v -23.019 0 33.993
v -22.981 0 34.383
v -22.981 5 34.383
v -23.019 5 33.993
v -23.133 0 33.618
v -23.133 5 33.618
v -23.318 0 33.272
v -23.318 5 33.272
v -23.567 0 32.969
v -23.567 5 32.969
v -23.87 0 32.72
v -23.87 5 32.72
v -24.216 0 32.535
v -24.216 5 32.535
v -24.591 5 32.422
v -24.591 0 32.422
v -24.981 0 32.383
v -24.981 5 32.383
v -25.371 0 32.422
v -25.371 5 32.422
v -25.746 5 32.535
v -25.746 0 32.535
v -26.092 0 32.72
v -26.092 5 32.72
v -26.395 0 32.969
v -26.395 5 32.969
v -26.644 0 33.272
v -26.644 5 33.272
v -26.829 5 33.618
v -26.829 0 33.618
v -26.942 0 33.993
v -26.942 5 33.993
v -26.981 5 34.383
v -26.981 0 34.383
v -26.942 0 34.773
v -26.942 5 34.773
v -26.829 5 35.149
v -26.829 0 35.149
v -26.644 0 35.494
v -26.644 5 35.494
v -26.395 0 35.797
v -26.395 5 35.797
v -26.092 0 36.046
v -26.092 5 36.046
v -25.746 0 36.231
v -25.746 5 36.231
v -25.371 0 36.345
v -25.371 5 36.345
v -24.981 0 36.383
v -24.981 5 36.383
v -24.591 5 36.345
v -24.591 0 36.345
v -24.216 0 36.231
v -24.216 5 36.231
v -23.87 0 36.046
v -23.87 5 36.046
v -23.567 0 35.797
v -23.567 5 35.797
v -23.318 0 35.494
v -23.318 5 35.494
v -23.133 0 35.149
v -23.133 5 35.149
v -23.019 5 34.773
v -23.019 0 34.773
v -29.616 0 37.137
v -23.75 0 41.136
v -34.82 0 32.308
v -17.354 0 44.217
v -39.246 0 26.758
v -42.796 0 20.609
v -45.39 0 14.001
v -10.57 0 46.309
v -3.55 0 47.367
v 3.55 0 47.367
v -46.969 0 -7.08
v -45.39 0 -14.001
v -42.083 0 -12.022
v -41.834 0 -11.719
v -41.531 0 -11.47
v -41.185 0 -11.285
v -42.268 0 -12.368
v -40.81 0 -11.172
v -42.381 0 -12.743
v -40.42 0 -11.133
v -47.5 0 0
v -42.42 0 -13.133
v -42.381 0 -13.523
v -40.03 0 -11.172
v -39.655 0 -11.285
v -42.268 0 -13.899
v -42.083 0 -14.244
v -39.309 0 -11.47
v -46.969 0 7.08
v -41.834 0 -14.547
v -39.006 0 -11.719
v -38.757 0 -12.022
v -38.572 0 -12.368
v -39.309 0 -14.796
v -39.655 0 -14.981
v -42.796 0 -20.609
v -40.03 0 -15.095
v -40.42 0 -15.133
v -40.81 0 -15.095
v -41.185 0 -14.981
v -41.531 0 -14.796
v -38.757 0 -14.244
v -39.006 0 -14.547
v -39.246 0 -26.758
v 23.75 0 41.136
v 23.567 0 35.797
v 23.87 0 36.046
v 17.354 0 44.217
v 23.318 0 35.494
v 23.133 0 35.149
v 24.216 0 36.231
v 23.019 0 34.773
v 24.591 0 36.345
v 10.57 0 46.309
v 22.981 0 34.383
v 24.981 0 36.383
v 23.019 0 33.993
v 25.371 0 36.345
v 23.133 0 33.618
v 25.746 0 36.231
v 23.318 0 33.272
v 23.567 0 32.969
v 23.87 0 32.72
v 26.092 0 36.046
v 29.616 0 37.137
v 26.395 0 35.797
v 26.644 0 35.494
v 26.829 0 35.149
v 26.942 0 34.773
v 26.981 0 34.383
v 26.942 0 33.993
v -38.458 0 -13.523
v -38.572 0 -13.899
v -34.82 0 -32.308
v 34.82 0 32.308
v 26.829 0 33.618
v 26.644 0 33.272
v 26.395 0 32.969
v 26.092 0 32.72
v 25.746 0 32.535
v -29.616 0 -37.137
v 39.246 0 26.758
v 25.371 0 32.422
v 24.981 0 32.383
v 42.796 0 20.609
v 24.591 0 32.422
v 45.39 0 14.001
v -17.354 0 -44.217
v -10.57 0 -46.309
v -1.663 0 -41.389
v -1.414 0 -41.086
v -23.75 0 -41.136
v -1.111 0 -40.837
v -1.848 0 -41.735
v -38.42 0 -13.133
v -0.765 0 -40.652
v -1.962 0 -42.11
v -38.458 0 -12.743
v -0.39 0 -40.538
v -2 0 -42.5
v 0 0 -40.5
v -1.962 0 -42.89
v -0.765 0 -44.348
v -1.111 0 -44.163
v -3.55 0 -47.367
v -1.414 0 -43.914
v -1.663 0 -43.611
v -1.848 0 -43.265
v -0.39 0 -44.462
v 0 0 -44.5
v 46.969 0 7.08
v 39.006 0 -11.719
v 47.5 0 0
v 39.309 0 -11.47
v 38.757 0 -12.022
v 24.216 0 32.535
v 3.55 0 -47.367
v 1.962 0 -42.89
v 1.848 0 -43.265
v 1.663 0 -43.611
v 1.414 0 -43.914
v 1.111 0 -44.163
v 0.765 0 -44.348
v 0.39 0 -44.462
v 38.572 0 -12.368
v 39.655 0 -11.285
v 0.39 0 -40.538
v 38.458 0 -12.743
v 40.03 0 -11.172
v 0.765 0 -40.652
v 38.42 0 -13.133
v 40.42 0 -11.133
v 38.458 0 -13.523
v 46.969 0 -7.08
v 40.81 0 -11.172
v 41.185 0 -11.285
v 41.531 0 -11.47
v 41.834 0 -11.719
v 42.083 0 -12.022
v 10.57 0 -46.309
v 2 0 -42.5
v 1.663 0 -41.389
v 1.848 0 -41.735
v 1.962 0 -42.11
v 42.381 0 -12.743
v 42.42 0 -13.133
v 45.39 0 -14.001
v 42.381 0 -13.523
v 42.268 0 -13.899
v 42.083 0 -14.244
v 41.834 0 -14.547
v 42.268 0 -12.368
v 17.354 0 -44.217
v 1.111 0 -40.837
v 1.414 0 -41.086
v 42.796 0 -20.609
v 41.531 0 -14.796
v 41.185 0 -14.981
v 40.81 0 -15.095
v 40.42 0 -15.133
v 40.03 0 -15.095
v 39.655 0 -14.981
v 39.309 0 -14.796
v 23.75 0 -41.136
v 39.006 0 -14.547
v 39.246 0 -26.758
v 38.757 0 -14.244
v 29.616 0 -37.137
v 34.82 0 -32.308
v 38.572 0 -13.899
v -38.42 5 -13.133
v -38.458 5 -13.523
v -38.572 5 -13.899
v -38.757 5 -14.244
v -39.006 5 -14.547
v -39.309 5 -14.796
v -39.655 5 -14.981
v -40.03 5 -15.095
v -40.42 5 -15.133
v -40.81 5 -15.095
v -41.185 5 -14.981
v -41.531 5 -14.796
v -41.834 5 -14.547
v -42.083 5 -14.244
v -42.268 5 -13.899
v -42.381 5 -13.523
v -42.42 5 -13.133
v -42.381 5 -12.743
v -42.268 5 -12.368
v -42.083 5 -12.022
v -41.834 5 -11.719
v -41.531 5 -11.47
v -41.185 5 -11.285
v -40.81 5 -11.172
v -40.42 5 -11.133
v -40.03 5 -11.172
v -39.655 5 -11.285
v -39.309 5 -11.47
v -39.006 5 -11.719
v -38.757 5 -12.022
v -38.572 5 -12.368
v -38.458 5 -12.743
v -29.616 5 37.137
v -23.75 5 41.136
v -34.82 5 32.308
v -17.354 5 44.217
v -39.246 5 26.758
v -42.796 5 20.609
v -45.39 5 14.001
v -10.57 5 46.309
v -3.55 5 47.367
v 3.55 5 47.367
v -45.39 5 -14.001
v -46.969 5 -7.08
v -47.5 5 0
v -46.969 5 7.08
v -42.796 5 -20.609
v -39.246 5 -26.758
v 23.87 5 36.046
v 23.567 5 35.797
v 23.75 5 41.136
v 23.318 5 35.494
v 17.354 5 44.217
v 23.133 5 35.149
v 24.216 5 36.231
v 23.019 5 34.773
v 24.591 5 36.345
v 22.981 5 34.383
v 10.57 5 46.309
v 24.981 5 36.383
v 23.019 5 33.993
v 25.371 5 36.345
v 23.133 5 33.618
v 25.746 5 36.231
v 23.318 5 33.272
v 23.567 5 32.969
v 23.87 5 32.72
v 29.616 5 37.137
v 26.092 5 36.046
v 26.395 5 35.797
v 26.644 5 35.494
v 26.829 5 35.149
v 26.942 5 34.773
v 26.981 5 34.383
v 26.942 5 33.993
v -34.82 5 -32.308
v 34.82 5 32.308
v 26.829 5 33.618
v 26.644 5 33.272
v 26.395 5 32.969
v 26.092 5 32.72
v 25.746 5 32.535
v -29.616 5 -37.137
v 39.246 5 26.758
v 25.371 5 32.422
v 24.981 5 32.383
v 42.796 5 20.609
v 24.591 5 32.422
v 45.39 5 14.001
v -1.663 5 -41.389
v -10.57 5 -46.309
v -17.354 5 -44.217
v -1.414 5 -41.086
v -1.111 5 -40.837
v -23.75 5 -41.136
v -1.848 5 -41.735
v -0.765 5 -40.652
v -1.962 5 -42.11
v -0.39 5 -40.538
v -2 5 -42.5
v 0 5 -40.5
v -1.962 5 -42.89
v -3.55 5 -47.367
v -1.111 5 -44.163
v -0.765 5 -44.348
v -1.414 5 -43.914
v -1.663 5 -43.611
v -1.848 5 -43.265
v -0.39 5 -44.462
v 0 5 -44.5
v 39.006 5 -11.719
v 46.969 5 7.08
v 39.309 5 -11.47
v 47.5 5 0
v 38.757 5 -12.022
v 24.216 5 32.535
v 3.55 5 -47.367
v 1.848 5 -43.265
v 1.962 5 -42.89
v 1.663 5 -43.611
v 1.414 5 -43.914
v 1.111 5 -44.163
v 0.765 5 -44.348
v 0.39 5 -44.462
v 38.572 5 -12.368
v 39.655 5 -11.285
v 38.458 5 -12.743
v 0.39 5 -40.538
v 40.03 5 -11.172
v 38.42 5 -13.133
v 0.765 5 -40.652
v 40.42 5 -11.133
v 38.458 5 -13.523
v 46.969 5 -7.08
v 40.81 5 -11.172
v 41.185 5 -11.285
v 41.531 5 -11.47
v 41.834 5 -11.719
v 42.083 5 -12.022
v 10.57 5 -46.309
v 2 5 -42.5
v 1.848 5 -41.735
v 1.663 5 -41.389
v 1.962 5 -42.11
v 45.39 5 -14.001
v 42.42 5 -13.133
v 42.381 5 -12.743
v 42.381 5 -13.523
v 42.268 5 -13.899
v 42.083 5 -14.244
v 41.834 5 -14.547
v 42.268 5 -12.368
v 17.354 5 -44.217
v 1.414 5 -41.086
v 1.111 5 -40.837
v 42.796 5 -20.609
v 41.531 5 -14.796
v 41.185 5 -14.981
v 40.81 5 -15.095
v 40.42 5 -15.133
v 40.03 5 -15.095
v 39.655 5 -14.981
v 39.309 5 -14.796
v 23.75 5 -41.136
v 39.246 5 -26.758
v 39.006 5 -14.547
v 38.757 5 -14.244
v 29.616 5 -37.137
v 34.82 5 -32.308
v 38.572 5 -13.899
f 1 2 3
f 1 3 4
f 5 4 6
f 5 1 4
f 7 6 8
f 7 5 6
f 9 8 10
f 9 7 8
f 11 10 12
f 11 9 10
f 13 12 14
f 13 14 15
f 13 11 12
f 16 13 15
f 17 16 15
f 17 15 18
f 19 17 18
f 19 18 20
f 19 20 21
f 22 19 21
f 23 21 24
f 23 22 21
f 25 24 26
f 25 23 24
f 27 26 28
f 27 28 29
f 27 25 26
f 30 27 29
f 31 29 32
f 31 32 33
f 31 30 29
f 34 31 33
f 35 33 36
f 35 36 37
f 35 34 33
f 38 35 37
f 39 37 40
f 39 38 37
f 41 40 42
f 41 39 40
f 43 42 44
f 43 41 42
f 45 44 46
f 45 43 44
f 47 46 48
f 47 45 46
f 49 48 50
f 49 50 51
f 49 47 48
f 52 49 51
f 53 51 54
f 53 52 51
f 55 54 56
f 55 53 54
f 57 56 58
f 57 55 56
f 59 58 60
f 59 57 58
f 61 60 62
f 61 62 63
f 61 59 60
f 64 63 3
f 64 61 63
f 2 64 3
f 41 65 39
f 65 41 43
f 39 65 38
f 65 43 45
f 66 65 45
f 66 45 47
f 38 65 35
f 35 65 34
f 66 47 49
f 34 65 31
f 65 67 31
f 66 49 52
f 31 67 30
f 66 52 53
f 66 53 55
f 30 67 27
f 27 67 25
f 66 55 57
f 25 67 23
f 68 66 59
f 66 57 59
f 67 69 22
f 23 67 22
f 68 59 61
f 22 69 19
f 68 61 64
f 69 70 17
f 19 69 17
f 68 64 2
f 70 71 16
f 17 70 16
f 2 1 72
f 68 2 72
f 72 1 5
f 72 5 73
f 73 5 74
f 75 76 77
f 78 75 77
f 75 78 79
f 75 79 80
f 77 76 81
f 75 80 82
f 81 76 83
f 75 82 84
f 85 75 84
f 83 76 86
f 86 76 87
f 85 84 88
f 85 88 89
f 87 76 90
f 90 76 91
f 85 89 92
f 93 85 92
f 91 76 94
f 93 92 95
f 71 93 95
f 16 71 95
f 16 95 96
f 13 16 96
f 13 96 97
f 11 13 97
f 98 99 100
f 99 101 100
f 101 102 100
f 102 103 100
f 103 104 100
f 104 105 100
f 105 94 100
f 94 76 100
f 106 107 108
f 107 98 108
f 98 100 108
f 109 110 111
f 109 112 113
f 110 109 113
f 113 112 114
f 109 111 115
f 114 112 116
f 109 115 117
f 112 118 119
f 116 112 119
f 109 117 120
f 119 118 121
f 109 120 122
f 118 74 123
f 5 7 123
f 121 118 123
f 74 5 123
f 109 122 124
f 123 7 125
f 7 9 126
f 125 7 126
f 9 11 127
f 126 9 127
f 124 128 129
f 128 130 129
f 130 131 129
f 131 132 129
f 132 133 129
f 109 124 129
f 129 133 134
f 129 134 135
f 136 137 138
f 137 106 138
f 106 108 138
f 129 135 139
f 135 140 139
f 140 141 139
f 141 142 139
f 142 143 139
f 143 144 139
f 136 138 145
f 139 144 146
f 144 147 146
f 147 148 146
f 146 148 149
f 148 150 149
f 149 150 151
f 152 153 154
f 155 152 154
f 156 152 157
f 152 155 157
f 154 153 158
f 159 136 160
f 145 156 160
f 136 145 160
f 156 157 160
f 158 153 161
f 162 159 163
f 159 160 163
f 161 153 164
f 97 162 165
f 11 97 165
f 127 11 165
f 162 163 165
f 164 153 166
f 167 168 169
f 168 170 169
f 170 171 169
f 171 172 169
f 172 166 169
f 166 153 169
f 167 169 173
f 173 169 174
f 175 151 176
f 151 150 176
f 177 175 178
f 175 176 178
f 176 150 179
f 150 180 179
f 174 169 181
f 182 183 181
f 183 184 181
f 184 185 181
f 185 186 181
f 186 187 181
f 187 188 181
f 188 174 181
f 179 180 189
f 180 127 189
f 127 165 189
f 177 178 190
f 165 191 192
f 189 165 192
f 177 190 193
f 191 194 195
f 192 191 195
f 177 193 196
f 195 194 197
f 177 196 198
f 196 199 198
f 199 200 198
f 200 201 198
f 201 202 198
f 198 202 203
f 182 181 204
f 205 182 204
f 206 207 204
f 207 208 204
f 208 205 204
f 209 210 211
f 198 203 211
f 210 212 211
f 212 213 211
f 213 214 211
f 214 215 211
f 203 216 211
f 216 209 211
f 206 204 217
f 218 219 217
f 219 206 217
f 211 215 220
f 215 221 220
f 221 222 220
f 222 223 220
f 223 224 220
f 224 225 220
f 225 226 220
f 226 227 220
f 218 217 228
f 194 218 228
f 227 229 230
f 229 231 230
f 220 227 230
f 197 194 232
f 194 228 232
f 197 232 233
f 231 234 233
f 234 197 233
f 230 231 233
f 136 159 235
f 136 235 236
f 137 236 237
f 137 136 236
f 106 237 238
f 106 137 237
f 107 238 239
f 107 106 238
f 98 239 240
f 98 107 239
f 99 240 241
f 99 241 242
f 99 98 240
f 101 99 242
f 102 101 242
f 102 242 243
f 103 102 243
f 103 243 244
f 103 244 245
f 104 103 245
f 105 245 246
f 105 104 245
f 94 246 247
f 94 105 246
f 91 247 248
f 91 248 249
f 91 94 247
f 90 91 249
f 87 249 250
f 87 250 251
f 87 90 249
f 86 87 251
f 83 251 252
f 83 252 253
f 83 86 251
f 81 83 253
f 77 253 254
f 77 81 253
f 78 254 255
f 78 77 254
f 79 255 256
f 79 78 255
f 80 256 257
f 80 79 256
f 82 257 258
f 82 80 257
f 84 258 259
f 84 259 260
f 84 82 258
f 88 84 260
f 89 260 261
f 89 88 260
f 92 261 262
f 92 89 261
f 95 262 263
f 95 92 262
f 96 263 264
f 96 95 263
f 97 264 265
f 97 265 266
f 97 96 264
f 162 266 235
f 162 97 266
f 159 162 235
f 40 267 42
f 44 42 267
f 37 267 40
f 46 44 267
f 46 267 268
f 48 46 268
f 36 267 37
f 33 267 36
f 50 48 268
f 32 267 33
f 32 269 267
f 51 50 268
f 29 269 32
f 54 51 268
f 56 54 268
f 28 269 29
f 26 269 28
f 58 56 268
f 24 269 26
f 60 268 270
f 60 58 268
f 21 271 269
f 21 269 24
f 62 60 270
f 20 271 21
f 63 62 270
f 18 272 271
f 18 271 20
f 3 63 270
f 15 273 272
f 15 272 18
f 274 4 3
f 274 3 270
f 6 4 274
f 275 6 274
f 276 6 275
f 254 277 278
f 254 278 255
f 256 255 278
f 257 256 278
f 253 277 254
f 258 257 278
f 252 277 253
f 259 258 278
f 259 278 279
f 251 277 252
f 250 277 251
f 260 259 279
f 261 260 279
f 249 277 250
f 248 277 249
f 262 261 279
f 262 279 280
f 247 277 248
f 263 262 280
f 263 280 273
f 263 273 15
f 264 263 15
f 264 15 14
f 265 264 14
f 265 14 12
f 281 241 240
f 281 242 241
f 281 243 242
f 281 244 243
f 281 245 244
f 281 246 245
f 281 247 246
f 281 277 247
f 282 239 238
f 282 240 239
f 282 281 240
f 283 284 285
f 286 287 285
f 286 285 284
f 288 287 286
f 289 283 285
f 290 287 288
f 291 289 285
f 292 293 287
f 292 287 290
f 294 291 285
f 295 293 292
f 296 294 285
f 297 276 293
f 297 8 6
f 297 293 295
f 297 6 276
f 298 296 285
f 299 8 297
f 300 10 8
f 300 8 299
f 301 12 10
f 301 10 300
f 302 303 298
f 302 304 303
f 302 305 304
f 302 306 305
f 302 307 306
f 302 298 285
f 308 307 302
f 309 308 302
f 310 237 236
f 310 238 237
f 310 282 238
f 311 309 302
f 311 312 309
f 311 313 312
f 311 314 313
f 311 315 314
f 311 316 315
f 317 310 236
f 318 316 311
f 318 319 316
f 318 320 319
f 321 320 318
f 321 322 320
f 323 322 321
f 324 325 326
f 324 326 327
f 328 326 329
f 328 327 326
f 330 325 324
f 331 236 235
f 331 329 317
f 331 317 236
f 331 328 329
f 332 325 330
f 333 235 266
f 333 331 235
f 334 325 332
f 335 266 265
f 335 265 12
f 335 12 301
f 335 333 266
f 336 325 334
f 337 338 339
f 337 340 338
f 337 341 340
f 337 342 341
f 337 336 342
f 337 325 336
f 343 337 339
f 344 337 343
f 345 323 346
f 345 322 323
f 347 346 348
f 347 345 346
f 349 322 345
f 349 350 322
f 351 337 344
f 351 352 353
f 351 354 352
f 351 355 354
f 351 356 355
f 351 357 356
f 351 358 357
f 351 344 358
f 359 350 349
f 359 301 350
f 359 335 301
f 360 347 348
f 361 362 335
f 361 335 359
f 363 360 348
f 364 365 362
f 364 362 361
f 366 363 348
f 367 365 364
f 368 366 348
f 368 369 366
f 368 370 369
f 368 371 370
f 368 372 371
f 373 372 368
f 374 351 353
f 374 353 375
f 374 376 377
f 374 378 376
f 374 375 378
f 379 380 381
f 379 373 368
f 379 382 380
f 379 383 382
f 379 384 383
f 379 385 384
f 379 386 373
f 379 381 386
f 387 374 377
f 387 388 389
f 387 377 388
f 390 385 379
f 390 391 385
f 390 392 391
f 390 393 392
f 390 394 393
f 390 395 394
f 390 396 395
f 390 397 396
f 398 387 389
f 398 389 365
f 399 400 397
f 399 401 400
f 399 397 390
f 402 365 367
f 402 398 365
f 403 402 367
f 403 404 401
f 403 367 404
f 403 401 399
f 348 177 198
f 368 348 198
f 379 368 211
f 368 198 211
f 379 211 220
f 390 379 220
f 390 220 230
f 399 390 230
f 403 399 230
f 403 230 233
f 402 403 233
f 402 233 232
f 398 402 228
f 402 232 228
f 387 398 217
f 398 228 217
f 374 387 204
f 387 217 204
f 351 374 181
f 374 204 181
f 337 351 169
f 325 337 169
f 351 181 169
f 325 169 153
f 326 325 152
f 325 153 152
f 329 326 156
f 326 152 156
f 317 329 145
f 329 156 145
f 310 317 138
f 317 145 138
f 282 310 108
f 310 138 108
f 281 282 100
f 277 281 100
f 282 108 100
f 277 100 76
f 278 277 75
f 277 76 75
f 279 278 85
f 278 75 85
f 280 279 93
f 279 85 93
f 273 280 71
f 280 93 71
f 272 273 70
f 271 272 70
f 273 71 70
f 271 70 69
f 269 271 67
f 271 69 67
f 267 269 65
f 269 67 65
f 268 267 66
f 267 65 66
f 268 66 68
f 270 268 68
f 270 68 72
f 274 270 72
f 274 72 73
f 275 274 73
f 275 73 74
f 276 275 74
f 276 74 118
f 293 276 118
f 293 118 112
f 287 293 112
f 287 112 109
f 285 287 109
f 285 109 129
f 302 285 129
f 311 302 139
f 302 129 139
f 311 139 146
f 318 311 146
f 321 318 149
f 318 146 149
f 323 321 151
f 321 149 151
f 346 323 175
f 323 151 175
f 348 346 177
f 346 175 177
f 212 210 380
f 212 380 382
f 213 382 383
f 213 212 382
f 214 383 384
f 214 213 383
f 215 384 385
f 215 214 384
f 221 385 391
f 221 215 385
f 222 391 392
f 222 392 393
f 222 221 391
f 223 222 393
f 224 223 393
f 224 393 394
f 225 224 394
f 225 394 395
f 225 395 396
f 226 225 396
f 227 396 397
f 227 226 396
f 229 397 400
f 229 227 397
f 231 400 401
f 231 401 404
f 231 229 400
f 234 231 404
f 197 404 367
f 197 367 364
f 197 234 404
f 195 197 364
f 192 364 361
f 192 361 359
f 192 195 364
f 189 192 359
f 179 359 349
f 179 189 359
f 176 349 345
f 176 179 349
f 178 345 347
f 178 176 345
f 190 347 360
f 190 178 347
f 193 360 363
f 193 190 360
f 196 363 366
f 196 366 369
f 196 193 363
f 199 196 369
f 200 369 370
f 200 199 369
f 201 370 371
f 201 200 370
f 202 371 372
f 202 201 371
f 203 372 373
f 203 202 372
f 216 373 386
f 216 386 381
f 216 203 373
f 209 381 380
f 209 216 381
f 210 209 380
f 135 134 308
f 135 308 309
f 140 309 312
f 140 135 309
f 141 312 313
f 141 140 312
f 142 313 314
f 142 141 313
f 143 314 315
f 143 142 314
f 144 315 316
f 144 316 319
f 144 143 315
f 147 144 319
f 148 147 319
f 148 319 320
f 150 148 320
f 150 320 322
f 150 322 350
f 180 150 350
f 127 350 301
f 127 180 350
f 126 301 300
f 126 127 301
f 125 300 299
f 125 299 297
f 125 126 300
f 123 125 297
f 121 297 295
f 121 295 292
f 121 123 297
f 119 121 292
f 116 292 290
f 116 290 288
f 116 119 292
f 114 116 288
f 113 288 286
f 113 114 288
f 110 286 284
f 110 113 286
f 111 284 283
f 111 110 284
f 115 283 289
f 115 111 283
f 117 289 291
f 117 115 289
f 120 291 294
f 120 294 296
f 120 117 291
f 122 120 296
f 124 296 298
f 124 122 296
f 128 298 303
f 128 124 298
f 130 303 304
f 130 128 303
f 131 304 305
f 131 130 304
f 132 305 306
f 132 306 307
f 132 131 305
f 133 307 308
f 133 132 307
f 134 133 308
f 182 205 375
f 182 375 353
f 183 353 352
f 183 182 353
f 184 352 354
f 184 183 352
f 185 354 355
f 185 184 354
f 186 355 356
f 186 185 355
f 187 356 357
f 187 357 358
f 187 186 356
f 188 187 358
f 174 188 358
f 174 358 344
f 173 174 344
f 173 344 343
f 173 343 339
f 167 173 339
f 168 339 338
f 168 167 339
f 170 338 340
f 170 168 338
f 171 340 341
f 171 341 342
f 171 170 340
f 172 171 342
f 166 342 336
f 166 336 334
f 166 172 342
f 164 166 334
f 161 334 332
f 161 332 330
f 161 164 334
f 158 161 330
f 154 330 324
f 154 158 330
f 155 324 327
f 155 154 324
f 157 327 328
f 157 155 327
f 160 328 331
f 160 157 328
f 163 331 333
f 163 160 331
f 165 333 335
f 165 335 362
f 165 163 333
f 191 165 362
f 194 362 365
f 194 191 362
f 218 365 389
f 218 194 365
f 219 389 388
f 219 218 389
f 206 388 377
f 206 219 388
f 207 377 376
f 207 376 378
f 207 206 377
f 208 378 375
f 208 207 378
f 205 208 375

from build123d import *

# Parameters (mm, degrees)
SKETCH1_R           = 47.5
SKETCH1_R_2         = 2
BOSS_EXTRUDE1_DEPTH = 5


with BuildPart() as part:
    # Sketch1 → Boss-Extrude1 (new body)
    with BuildSketch(Plane(origin=(0, 0, 0), x_dir=(1, 0, 0), z_dir=(0, 1, 0))):
        Circle(SKETCH1_R)
        with Locations((0, 42.5)):
            Circle(SKETCH1_R_2, mode=Mode.SUBTRACT)
        with Locations((40.419901943, 13.133222261)):
            Circle(SKETCH1_R_2, mode=Mode.SUBTRACT)
        with Locations((24.980873222, -34.383222261)):
            Circle(SKETCH1_R_2, mode=Mode.SUBTRACT)
        with Locations((-24.980873222, -34.383222261)):
            Circle(SKETCH1_R_2, mode=Mode.SUBTRACT)
        with Locations((-40.419901943, 13.133222261)):
            Circle(SKETCH1_R_2, mode=Mode.SUBTRACT)
    extrude(amount=BOSS_EXTRUDE1_DEPTH)


solid = part.part
